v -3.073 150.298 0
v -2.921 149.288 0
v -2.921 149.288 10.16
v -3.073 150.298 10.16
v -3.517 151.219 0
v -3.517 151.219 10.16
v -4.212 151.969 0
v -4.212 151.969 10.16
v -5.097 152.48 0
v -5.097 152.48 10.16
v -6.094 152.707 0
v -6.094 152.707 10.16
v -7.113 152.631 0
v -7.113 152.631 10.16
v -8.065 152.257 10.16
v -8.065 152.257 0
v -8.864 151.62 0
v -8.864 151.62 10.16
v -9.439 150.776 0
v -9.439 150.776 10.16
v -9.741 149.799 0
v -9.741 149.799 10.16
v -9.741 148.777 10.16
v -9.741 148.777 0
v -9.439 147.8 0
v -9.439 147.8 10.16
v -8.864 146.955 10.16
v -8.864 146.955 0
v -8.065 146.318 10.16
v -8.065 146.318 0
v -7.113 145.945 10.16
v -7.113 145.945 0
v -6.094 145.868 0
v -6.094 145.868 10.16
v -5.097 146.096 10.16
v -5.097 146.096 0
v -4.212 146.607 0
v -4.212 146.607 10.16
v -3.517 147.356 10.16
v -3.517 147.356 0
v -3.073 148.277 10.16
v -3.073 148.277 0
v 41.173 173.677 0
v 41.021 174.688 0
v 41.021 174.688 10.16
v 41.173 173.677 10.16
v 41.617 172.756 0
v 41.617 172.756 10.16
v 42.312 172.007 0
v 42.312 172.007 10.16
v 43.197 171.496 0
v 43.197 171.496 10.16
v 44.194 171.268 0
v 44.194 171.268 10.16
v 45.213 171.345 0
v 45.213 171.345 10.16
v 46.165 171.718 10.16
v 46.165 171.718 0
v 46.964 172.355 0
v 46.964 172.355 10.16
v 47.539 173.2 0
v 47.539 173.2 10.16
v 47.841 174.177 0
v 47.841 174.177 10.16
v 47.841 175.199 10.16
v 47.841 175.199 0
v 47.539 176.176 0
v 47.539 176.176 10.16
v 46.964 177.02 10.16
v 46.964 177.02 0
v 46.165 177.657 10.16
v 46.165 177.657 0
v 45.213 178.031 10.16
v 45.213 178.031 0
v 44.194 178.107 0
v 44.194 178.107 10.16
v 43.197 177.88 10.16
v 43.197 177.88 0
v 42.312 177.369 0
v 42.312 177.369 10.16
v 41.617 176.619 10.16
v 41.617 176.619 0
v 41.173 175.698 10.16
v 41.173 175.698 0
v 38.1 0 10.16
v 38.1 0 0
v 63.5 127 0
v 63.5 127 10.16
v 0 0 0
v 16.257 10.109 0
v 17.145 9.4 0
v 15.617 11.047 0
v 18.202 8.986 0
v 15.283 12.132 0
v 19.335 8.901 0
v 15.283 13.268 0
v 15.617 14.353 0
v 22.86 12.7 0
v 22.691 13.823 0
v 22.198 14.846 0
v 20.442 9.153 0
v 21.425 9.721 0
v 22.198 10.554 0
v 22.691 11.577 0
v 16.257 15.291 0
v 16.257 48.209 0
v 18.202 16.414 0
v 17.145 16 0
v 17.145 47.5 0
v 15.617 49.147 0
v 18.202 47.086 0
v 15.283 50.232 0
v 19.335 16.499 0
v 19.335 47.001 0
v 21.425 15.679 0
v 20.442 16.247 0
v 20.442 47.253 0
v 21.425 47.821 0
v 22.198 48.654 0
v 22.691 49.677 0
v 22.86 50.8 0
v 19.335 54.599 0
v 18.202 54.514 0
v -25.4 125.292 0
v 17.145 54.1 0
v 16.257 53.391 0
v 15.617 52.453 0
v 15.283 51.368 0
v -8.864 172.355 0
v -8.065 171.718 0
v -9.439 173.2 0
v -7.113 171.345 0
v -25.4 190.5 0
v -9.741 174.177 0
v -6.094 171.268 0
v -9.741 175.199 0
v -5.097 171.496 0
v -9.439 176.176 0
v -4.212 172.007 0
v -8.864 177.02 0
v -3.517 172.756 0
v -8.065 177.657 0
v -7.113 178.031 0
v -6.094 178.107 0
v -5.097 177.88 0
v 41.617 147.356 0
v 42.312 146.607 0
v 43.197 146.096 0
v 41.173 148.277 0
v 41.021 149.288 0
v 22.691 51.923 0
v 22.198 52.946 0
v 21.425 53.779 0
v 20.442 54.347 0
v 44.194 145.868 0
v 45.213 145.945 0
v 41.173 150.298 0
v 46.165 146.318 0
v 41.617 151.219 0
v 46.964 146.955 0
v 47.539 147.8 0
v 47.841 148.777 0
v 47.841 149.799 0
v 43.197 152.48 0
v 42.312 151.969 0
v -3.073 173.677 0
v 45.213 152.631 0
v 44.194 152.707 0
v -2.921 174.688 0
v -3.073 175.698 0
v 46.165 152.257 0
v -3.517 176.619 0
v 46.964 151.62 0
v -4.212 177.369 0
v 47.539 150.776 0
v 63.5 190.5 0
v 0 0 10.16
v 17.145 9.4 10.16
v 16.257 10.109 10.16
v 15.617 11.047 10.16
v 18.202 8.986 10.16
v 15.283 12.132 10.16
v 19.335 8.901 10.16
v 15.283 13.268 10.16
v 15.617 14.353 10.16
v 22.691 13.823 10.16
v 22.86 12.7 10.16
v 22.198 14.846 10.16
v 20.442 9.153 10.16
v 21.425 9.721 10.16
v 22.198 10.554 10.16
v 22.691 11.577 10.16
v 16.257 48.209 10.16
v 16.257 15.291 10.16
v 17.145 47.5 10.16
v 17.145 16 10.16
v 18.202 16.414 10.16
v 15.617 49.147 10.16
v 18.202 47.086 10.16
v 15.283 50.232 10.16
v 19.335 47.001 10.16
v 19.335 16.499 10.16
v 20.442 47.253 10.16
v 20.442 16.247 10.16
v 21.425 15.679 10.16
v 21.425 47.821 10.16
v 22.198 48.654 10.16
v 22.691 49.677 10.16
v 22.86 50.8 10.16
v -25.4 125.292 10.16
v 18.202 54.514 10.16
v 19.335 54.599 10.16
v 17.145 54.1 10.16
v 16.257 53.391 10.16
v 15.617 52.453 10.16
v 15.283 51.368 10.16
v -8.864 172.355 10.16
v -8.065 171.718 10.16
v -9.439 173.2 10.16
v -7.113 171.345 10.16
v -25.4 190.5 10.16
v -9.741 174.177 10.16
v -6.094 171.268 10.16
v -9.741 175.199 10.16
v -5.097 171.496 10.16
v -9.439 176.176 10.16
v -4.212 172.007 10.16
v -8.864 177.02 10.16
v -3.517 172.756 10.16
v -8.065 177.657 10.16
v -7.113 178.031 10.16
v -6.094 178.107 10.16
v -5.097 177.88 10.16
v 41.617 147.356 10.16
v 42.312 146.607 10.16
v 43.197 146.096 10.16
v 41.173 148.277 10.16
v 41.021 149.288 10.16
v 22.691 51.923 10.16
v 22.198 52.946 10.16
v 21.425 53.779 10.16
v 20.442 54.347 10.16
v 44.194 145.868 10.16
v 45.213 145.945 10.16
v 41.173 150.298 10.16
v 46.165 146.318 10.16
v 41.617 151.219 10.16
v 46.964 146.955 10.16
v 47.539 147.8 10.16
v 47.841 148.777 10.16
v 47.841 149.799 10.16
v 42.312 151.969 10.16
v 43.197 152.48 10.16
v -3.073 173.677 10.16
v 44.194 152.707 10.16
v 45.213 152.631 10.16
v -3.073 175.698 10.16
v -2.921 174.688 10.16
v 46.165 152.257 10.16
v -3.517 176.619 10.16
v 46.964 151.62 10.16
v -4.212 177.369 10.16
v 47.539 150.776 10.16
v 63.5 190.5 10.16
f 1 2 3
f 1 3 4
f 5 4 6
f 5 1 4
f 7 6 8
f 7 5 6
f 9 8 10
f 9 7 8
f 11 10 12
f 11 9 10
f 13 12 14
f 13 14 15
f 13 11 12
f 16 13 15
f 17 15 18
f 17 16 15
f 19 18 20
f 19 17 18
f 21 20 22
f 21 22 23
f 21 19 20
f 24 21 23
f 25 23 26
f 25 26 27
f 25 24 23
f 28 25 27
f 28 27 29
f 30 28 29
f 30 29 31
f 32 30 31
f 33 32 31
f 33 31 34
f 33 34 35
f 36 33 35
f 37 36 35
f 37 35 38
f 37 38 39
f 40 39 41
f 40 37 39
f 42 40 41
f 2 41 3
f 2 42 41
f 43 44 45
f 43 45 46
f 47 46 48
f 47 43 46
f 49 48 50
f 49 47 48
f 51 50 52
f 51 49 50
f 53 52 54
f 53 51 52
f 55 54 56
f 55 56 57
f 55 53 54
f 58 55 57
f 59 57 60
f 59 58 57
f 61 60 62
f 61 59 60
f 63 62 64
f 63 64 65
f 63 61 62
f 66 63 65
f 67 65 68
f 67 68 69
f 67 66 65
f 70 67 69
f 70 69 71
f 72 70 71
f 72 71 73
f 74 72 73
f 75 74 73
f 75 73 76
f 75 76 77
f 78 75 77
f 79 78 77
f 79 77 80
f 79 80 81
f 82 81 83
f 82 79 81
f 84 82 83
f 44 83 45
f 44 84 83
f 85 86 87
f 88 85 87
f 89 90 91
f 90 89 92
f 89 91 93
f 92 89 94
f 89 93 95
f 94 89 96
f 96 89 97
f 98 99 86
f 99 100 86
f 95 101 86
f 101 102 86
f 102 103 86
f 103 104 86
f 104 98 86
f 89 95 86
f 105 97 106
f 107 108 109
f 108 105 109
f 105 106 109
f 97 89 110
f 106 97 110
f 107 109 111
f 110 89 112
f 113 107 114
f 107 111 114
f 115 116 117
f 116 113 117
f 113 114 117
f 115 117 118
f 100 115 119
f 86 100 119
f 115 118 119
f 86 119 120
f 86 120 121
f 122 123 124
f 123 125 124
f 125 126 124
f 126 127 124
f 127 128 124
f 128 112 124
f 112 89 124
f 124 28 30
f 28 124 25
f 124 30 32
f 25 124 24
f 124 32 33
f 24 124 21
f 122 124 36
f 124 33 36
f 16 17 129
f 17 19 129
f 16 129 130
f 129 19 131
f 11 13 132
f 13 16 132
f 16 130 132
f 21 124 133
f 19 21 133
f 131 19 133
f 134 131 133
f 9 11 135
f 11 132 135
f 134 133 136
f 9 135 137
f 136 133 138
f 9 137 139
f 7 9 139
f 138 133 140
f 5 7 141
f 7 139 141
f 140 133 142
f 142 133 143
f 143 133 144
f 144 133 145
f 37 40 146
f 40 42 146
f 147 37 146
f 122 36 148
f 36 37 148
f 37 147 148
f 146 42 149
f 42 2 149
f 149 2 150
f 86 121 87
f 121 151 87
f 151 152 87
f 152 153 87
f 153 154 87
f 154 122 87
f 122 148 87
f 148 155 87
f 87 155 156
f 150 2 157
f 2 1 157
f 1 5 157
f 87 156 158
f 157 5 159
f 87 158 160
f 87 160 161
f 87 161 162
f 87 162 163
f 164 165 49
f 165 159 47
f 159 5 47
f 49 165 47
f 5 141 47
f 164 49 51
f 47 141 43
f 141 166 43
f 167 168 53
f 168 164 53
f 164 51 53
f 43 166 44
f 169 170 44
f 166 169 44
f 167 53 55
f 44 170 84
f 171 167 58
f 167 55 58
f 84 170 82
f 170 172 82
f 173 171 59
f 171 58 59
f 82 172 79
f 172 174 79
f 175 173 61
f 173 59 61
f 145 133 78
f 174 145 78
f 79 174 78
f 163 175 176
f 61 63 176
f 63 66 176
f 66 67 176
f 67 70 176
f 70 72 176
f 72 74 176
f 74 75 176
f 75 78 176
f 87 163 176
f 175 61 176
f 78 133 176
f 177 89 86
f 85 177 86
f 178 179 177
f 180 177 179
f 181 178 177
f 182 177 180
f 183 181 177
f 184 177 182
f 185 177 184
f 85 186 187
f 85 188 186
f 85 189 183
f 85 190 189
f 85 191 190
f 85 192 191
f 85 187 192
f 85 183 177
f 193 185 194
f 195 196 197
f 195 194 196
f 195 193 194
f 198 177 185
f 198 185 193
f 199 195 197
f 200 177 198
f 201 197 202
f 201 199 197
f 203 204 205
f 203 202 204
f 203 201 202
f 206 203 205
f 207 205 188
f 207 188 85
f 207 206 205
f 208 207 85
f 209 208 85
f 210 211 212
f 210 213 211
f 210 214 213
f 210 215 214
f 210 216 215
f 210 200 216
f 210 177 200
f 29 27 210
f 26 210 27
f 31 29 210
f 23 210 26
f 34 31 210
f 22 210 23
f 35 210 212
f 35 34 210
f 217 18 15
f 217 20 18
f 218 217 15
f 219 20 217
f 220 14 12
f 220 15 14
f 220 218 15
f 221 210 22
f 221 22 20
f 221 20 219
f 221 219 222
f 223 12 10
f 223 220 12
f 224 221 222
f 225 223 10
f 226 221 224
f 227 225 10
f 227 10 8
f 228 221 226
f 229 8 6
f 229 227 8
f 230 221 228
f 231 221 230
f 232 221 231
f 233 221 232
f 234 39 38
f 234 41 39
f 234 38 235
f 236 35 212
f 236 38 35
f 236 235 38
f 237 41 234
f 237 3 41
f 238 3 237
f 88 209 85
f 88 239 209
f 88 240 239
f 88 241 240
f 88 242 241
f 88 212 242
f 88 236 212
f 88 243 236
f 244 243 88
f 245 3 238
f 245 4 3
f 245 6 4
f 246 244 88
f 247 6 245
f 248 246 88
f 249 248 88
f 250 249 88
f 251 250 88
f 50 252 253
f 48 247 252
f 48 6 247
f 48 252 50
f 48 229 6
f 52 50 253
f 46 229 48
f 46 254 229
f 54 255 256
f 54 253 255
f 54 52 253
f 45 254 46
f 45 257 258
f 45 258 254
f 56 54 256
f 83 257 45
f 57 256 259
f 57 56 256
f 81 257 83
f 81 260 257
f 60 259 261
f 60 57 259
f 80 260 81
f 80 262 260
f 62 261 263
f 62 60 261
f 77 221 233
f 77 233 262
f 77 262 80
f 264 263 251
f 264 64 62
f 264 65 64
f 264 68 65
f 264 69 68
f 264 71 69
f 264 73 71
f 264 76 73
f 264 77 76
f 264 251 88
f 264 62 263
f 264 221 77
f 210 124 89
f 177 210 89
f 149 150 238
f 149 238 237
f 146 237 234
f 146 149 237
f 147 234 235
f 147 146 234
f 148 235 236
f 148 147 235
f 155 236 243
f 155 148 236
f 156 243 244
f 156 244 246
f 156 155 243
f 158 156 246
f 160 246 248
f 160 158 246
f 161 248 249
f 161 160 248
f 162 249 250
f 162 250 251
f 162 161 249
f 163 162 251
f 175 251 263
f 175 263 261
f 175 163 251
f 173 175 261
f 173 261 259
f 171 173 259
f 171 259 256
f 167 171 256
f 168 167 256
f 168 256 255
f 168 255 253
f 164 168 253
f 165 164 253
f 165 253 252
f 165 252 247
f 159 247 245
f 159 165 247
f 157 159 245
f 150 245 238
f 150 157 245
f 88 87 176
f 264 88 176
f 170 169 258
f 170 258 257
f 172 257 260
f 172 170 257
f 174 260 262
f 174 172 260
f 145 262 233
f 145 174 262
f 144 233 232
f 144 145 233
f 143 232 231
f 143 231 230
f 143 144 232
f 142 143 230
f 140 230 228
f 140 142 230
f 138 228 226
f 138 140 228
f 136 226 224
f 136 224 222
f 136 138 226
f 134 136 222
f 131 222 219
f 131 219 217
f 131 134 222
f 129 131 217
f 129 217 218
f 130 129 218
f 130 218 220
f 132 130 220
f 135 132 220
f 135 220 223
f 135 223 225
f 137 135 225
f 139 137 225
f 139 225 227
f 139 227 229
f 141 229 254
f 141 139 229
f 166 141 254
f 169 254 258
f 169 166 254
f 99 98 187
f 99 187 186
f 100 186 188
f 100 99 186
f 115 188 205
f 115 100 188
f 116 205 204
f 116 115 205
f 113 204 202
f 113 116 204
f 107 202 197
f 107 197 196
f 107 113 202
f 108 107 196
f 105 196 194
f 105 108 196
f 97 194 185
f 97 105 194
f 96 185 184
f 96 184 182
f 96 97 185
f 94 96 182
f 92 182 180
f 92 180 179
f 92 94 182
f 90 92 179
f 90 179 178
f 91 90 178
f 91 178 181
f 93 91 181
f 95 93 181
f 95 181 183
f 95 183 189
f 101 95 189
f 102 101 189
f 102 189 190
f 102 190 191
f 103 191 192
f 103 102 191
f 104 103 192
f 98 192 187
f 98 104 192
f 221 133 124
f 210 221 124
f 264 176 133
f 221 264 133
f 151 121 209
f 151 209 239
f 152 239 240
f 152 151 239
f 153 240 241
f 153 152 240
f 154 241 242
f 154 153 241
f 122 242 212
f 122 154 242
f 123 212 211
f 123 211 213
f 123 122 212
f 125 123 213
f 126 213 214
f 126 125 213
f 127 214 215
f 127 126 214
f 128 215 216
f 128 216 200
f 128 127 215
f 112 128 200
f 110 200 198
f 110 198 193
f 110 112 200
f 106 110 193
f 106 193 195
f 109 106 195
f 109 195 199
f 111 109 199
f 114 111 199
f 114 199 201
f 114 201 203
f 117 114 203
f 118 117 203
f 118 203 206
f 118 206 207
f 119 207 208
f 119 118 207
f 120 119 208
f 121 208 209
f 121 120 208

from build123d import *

# Parameters (mm, degrees)
SKETCH1_R           = 3.81
SKETCH1_R_2         = 3.429
BOSS_EXTRUDE1_DEPTH = 10.16


with BuildPart() as part:
    # Sketch1 → Boss-Extrude1 (new body)
    with BuildSketch(Plane.XY):
        Polygon((0, 0), (38.1, 0), (63.5, 127), (63.5, 190.5), (-25.4, 190.5), (-25.4, 125.291623319), align=None)
        with Locations((19.05, 12.7)):
            Circle(SKETCH1_R, mode=Mode.SUBTRACT)
        with Locations((19.05, 50.8)):
            Circle(SKETCH1_R, mode=Mode.SUBTRACT)
        with Locations((-6.35, 174.687730396)):
            Circle(SKETCH1_R_2, mode=Mode.SUBTRACT)
        with Locations((-6.35, 149.287730396)):
            Circle(SKETCH1_R_2, mode=Mode.SUBTRACT)
        with Locations(Location((44.45, 149.287730396, 0), (0, 0, 180))):
            Circle(SKETCH1_R_2, mode=Mode.SUBTRACT)
        with Locations(Location((44.45, 174.687730396, 0), (0, 0, 180))):
            Circle(SKETCH1_R_2, mode=Mode.SUBTRACT)
    extrude(amount=BOSS_EXTRUDE1_DEPTH)


solid = part.part
